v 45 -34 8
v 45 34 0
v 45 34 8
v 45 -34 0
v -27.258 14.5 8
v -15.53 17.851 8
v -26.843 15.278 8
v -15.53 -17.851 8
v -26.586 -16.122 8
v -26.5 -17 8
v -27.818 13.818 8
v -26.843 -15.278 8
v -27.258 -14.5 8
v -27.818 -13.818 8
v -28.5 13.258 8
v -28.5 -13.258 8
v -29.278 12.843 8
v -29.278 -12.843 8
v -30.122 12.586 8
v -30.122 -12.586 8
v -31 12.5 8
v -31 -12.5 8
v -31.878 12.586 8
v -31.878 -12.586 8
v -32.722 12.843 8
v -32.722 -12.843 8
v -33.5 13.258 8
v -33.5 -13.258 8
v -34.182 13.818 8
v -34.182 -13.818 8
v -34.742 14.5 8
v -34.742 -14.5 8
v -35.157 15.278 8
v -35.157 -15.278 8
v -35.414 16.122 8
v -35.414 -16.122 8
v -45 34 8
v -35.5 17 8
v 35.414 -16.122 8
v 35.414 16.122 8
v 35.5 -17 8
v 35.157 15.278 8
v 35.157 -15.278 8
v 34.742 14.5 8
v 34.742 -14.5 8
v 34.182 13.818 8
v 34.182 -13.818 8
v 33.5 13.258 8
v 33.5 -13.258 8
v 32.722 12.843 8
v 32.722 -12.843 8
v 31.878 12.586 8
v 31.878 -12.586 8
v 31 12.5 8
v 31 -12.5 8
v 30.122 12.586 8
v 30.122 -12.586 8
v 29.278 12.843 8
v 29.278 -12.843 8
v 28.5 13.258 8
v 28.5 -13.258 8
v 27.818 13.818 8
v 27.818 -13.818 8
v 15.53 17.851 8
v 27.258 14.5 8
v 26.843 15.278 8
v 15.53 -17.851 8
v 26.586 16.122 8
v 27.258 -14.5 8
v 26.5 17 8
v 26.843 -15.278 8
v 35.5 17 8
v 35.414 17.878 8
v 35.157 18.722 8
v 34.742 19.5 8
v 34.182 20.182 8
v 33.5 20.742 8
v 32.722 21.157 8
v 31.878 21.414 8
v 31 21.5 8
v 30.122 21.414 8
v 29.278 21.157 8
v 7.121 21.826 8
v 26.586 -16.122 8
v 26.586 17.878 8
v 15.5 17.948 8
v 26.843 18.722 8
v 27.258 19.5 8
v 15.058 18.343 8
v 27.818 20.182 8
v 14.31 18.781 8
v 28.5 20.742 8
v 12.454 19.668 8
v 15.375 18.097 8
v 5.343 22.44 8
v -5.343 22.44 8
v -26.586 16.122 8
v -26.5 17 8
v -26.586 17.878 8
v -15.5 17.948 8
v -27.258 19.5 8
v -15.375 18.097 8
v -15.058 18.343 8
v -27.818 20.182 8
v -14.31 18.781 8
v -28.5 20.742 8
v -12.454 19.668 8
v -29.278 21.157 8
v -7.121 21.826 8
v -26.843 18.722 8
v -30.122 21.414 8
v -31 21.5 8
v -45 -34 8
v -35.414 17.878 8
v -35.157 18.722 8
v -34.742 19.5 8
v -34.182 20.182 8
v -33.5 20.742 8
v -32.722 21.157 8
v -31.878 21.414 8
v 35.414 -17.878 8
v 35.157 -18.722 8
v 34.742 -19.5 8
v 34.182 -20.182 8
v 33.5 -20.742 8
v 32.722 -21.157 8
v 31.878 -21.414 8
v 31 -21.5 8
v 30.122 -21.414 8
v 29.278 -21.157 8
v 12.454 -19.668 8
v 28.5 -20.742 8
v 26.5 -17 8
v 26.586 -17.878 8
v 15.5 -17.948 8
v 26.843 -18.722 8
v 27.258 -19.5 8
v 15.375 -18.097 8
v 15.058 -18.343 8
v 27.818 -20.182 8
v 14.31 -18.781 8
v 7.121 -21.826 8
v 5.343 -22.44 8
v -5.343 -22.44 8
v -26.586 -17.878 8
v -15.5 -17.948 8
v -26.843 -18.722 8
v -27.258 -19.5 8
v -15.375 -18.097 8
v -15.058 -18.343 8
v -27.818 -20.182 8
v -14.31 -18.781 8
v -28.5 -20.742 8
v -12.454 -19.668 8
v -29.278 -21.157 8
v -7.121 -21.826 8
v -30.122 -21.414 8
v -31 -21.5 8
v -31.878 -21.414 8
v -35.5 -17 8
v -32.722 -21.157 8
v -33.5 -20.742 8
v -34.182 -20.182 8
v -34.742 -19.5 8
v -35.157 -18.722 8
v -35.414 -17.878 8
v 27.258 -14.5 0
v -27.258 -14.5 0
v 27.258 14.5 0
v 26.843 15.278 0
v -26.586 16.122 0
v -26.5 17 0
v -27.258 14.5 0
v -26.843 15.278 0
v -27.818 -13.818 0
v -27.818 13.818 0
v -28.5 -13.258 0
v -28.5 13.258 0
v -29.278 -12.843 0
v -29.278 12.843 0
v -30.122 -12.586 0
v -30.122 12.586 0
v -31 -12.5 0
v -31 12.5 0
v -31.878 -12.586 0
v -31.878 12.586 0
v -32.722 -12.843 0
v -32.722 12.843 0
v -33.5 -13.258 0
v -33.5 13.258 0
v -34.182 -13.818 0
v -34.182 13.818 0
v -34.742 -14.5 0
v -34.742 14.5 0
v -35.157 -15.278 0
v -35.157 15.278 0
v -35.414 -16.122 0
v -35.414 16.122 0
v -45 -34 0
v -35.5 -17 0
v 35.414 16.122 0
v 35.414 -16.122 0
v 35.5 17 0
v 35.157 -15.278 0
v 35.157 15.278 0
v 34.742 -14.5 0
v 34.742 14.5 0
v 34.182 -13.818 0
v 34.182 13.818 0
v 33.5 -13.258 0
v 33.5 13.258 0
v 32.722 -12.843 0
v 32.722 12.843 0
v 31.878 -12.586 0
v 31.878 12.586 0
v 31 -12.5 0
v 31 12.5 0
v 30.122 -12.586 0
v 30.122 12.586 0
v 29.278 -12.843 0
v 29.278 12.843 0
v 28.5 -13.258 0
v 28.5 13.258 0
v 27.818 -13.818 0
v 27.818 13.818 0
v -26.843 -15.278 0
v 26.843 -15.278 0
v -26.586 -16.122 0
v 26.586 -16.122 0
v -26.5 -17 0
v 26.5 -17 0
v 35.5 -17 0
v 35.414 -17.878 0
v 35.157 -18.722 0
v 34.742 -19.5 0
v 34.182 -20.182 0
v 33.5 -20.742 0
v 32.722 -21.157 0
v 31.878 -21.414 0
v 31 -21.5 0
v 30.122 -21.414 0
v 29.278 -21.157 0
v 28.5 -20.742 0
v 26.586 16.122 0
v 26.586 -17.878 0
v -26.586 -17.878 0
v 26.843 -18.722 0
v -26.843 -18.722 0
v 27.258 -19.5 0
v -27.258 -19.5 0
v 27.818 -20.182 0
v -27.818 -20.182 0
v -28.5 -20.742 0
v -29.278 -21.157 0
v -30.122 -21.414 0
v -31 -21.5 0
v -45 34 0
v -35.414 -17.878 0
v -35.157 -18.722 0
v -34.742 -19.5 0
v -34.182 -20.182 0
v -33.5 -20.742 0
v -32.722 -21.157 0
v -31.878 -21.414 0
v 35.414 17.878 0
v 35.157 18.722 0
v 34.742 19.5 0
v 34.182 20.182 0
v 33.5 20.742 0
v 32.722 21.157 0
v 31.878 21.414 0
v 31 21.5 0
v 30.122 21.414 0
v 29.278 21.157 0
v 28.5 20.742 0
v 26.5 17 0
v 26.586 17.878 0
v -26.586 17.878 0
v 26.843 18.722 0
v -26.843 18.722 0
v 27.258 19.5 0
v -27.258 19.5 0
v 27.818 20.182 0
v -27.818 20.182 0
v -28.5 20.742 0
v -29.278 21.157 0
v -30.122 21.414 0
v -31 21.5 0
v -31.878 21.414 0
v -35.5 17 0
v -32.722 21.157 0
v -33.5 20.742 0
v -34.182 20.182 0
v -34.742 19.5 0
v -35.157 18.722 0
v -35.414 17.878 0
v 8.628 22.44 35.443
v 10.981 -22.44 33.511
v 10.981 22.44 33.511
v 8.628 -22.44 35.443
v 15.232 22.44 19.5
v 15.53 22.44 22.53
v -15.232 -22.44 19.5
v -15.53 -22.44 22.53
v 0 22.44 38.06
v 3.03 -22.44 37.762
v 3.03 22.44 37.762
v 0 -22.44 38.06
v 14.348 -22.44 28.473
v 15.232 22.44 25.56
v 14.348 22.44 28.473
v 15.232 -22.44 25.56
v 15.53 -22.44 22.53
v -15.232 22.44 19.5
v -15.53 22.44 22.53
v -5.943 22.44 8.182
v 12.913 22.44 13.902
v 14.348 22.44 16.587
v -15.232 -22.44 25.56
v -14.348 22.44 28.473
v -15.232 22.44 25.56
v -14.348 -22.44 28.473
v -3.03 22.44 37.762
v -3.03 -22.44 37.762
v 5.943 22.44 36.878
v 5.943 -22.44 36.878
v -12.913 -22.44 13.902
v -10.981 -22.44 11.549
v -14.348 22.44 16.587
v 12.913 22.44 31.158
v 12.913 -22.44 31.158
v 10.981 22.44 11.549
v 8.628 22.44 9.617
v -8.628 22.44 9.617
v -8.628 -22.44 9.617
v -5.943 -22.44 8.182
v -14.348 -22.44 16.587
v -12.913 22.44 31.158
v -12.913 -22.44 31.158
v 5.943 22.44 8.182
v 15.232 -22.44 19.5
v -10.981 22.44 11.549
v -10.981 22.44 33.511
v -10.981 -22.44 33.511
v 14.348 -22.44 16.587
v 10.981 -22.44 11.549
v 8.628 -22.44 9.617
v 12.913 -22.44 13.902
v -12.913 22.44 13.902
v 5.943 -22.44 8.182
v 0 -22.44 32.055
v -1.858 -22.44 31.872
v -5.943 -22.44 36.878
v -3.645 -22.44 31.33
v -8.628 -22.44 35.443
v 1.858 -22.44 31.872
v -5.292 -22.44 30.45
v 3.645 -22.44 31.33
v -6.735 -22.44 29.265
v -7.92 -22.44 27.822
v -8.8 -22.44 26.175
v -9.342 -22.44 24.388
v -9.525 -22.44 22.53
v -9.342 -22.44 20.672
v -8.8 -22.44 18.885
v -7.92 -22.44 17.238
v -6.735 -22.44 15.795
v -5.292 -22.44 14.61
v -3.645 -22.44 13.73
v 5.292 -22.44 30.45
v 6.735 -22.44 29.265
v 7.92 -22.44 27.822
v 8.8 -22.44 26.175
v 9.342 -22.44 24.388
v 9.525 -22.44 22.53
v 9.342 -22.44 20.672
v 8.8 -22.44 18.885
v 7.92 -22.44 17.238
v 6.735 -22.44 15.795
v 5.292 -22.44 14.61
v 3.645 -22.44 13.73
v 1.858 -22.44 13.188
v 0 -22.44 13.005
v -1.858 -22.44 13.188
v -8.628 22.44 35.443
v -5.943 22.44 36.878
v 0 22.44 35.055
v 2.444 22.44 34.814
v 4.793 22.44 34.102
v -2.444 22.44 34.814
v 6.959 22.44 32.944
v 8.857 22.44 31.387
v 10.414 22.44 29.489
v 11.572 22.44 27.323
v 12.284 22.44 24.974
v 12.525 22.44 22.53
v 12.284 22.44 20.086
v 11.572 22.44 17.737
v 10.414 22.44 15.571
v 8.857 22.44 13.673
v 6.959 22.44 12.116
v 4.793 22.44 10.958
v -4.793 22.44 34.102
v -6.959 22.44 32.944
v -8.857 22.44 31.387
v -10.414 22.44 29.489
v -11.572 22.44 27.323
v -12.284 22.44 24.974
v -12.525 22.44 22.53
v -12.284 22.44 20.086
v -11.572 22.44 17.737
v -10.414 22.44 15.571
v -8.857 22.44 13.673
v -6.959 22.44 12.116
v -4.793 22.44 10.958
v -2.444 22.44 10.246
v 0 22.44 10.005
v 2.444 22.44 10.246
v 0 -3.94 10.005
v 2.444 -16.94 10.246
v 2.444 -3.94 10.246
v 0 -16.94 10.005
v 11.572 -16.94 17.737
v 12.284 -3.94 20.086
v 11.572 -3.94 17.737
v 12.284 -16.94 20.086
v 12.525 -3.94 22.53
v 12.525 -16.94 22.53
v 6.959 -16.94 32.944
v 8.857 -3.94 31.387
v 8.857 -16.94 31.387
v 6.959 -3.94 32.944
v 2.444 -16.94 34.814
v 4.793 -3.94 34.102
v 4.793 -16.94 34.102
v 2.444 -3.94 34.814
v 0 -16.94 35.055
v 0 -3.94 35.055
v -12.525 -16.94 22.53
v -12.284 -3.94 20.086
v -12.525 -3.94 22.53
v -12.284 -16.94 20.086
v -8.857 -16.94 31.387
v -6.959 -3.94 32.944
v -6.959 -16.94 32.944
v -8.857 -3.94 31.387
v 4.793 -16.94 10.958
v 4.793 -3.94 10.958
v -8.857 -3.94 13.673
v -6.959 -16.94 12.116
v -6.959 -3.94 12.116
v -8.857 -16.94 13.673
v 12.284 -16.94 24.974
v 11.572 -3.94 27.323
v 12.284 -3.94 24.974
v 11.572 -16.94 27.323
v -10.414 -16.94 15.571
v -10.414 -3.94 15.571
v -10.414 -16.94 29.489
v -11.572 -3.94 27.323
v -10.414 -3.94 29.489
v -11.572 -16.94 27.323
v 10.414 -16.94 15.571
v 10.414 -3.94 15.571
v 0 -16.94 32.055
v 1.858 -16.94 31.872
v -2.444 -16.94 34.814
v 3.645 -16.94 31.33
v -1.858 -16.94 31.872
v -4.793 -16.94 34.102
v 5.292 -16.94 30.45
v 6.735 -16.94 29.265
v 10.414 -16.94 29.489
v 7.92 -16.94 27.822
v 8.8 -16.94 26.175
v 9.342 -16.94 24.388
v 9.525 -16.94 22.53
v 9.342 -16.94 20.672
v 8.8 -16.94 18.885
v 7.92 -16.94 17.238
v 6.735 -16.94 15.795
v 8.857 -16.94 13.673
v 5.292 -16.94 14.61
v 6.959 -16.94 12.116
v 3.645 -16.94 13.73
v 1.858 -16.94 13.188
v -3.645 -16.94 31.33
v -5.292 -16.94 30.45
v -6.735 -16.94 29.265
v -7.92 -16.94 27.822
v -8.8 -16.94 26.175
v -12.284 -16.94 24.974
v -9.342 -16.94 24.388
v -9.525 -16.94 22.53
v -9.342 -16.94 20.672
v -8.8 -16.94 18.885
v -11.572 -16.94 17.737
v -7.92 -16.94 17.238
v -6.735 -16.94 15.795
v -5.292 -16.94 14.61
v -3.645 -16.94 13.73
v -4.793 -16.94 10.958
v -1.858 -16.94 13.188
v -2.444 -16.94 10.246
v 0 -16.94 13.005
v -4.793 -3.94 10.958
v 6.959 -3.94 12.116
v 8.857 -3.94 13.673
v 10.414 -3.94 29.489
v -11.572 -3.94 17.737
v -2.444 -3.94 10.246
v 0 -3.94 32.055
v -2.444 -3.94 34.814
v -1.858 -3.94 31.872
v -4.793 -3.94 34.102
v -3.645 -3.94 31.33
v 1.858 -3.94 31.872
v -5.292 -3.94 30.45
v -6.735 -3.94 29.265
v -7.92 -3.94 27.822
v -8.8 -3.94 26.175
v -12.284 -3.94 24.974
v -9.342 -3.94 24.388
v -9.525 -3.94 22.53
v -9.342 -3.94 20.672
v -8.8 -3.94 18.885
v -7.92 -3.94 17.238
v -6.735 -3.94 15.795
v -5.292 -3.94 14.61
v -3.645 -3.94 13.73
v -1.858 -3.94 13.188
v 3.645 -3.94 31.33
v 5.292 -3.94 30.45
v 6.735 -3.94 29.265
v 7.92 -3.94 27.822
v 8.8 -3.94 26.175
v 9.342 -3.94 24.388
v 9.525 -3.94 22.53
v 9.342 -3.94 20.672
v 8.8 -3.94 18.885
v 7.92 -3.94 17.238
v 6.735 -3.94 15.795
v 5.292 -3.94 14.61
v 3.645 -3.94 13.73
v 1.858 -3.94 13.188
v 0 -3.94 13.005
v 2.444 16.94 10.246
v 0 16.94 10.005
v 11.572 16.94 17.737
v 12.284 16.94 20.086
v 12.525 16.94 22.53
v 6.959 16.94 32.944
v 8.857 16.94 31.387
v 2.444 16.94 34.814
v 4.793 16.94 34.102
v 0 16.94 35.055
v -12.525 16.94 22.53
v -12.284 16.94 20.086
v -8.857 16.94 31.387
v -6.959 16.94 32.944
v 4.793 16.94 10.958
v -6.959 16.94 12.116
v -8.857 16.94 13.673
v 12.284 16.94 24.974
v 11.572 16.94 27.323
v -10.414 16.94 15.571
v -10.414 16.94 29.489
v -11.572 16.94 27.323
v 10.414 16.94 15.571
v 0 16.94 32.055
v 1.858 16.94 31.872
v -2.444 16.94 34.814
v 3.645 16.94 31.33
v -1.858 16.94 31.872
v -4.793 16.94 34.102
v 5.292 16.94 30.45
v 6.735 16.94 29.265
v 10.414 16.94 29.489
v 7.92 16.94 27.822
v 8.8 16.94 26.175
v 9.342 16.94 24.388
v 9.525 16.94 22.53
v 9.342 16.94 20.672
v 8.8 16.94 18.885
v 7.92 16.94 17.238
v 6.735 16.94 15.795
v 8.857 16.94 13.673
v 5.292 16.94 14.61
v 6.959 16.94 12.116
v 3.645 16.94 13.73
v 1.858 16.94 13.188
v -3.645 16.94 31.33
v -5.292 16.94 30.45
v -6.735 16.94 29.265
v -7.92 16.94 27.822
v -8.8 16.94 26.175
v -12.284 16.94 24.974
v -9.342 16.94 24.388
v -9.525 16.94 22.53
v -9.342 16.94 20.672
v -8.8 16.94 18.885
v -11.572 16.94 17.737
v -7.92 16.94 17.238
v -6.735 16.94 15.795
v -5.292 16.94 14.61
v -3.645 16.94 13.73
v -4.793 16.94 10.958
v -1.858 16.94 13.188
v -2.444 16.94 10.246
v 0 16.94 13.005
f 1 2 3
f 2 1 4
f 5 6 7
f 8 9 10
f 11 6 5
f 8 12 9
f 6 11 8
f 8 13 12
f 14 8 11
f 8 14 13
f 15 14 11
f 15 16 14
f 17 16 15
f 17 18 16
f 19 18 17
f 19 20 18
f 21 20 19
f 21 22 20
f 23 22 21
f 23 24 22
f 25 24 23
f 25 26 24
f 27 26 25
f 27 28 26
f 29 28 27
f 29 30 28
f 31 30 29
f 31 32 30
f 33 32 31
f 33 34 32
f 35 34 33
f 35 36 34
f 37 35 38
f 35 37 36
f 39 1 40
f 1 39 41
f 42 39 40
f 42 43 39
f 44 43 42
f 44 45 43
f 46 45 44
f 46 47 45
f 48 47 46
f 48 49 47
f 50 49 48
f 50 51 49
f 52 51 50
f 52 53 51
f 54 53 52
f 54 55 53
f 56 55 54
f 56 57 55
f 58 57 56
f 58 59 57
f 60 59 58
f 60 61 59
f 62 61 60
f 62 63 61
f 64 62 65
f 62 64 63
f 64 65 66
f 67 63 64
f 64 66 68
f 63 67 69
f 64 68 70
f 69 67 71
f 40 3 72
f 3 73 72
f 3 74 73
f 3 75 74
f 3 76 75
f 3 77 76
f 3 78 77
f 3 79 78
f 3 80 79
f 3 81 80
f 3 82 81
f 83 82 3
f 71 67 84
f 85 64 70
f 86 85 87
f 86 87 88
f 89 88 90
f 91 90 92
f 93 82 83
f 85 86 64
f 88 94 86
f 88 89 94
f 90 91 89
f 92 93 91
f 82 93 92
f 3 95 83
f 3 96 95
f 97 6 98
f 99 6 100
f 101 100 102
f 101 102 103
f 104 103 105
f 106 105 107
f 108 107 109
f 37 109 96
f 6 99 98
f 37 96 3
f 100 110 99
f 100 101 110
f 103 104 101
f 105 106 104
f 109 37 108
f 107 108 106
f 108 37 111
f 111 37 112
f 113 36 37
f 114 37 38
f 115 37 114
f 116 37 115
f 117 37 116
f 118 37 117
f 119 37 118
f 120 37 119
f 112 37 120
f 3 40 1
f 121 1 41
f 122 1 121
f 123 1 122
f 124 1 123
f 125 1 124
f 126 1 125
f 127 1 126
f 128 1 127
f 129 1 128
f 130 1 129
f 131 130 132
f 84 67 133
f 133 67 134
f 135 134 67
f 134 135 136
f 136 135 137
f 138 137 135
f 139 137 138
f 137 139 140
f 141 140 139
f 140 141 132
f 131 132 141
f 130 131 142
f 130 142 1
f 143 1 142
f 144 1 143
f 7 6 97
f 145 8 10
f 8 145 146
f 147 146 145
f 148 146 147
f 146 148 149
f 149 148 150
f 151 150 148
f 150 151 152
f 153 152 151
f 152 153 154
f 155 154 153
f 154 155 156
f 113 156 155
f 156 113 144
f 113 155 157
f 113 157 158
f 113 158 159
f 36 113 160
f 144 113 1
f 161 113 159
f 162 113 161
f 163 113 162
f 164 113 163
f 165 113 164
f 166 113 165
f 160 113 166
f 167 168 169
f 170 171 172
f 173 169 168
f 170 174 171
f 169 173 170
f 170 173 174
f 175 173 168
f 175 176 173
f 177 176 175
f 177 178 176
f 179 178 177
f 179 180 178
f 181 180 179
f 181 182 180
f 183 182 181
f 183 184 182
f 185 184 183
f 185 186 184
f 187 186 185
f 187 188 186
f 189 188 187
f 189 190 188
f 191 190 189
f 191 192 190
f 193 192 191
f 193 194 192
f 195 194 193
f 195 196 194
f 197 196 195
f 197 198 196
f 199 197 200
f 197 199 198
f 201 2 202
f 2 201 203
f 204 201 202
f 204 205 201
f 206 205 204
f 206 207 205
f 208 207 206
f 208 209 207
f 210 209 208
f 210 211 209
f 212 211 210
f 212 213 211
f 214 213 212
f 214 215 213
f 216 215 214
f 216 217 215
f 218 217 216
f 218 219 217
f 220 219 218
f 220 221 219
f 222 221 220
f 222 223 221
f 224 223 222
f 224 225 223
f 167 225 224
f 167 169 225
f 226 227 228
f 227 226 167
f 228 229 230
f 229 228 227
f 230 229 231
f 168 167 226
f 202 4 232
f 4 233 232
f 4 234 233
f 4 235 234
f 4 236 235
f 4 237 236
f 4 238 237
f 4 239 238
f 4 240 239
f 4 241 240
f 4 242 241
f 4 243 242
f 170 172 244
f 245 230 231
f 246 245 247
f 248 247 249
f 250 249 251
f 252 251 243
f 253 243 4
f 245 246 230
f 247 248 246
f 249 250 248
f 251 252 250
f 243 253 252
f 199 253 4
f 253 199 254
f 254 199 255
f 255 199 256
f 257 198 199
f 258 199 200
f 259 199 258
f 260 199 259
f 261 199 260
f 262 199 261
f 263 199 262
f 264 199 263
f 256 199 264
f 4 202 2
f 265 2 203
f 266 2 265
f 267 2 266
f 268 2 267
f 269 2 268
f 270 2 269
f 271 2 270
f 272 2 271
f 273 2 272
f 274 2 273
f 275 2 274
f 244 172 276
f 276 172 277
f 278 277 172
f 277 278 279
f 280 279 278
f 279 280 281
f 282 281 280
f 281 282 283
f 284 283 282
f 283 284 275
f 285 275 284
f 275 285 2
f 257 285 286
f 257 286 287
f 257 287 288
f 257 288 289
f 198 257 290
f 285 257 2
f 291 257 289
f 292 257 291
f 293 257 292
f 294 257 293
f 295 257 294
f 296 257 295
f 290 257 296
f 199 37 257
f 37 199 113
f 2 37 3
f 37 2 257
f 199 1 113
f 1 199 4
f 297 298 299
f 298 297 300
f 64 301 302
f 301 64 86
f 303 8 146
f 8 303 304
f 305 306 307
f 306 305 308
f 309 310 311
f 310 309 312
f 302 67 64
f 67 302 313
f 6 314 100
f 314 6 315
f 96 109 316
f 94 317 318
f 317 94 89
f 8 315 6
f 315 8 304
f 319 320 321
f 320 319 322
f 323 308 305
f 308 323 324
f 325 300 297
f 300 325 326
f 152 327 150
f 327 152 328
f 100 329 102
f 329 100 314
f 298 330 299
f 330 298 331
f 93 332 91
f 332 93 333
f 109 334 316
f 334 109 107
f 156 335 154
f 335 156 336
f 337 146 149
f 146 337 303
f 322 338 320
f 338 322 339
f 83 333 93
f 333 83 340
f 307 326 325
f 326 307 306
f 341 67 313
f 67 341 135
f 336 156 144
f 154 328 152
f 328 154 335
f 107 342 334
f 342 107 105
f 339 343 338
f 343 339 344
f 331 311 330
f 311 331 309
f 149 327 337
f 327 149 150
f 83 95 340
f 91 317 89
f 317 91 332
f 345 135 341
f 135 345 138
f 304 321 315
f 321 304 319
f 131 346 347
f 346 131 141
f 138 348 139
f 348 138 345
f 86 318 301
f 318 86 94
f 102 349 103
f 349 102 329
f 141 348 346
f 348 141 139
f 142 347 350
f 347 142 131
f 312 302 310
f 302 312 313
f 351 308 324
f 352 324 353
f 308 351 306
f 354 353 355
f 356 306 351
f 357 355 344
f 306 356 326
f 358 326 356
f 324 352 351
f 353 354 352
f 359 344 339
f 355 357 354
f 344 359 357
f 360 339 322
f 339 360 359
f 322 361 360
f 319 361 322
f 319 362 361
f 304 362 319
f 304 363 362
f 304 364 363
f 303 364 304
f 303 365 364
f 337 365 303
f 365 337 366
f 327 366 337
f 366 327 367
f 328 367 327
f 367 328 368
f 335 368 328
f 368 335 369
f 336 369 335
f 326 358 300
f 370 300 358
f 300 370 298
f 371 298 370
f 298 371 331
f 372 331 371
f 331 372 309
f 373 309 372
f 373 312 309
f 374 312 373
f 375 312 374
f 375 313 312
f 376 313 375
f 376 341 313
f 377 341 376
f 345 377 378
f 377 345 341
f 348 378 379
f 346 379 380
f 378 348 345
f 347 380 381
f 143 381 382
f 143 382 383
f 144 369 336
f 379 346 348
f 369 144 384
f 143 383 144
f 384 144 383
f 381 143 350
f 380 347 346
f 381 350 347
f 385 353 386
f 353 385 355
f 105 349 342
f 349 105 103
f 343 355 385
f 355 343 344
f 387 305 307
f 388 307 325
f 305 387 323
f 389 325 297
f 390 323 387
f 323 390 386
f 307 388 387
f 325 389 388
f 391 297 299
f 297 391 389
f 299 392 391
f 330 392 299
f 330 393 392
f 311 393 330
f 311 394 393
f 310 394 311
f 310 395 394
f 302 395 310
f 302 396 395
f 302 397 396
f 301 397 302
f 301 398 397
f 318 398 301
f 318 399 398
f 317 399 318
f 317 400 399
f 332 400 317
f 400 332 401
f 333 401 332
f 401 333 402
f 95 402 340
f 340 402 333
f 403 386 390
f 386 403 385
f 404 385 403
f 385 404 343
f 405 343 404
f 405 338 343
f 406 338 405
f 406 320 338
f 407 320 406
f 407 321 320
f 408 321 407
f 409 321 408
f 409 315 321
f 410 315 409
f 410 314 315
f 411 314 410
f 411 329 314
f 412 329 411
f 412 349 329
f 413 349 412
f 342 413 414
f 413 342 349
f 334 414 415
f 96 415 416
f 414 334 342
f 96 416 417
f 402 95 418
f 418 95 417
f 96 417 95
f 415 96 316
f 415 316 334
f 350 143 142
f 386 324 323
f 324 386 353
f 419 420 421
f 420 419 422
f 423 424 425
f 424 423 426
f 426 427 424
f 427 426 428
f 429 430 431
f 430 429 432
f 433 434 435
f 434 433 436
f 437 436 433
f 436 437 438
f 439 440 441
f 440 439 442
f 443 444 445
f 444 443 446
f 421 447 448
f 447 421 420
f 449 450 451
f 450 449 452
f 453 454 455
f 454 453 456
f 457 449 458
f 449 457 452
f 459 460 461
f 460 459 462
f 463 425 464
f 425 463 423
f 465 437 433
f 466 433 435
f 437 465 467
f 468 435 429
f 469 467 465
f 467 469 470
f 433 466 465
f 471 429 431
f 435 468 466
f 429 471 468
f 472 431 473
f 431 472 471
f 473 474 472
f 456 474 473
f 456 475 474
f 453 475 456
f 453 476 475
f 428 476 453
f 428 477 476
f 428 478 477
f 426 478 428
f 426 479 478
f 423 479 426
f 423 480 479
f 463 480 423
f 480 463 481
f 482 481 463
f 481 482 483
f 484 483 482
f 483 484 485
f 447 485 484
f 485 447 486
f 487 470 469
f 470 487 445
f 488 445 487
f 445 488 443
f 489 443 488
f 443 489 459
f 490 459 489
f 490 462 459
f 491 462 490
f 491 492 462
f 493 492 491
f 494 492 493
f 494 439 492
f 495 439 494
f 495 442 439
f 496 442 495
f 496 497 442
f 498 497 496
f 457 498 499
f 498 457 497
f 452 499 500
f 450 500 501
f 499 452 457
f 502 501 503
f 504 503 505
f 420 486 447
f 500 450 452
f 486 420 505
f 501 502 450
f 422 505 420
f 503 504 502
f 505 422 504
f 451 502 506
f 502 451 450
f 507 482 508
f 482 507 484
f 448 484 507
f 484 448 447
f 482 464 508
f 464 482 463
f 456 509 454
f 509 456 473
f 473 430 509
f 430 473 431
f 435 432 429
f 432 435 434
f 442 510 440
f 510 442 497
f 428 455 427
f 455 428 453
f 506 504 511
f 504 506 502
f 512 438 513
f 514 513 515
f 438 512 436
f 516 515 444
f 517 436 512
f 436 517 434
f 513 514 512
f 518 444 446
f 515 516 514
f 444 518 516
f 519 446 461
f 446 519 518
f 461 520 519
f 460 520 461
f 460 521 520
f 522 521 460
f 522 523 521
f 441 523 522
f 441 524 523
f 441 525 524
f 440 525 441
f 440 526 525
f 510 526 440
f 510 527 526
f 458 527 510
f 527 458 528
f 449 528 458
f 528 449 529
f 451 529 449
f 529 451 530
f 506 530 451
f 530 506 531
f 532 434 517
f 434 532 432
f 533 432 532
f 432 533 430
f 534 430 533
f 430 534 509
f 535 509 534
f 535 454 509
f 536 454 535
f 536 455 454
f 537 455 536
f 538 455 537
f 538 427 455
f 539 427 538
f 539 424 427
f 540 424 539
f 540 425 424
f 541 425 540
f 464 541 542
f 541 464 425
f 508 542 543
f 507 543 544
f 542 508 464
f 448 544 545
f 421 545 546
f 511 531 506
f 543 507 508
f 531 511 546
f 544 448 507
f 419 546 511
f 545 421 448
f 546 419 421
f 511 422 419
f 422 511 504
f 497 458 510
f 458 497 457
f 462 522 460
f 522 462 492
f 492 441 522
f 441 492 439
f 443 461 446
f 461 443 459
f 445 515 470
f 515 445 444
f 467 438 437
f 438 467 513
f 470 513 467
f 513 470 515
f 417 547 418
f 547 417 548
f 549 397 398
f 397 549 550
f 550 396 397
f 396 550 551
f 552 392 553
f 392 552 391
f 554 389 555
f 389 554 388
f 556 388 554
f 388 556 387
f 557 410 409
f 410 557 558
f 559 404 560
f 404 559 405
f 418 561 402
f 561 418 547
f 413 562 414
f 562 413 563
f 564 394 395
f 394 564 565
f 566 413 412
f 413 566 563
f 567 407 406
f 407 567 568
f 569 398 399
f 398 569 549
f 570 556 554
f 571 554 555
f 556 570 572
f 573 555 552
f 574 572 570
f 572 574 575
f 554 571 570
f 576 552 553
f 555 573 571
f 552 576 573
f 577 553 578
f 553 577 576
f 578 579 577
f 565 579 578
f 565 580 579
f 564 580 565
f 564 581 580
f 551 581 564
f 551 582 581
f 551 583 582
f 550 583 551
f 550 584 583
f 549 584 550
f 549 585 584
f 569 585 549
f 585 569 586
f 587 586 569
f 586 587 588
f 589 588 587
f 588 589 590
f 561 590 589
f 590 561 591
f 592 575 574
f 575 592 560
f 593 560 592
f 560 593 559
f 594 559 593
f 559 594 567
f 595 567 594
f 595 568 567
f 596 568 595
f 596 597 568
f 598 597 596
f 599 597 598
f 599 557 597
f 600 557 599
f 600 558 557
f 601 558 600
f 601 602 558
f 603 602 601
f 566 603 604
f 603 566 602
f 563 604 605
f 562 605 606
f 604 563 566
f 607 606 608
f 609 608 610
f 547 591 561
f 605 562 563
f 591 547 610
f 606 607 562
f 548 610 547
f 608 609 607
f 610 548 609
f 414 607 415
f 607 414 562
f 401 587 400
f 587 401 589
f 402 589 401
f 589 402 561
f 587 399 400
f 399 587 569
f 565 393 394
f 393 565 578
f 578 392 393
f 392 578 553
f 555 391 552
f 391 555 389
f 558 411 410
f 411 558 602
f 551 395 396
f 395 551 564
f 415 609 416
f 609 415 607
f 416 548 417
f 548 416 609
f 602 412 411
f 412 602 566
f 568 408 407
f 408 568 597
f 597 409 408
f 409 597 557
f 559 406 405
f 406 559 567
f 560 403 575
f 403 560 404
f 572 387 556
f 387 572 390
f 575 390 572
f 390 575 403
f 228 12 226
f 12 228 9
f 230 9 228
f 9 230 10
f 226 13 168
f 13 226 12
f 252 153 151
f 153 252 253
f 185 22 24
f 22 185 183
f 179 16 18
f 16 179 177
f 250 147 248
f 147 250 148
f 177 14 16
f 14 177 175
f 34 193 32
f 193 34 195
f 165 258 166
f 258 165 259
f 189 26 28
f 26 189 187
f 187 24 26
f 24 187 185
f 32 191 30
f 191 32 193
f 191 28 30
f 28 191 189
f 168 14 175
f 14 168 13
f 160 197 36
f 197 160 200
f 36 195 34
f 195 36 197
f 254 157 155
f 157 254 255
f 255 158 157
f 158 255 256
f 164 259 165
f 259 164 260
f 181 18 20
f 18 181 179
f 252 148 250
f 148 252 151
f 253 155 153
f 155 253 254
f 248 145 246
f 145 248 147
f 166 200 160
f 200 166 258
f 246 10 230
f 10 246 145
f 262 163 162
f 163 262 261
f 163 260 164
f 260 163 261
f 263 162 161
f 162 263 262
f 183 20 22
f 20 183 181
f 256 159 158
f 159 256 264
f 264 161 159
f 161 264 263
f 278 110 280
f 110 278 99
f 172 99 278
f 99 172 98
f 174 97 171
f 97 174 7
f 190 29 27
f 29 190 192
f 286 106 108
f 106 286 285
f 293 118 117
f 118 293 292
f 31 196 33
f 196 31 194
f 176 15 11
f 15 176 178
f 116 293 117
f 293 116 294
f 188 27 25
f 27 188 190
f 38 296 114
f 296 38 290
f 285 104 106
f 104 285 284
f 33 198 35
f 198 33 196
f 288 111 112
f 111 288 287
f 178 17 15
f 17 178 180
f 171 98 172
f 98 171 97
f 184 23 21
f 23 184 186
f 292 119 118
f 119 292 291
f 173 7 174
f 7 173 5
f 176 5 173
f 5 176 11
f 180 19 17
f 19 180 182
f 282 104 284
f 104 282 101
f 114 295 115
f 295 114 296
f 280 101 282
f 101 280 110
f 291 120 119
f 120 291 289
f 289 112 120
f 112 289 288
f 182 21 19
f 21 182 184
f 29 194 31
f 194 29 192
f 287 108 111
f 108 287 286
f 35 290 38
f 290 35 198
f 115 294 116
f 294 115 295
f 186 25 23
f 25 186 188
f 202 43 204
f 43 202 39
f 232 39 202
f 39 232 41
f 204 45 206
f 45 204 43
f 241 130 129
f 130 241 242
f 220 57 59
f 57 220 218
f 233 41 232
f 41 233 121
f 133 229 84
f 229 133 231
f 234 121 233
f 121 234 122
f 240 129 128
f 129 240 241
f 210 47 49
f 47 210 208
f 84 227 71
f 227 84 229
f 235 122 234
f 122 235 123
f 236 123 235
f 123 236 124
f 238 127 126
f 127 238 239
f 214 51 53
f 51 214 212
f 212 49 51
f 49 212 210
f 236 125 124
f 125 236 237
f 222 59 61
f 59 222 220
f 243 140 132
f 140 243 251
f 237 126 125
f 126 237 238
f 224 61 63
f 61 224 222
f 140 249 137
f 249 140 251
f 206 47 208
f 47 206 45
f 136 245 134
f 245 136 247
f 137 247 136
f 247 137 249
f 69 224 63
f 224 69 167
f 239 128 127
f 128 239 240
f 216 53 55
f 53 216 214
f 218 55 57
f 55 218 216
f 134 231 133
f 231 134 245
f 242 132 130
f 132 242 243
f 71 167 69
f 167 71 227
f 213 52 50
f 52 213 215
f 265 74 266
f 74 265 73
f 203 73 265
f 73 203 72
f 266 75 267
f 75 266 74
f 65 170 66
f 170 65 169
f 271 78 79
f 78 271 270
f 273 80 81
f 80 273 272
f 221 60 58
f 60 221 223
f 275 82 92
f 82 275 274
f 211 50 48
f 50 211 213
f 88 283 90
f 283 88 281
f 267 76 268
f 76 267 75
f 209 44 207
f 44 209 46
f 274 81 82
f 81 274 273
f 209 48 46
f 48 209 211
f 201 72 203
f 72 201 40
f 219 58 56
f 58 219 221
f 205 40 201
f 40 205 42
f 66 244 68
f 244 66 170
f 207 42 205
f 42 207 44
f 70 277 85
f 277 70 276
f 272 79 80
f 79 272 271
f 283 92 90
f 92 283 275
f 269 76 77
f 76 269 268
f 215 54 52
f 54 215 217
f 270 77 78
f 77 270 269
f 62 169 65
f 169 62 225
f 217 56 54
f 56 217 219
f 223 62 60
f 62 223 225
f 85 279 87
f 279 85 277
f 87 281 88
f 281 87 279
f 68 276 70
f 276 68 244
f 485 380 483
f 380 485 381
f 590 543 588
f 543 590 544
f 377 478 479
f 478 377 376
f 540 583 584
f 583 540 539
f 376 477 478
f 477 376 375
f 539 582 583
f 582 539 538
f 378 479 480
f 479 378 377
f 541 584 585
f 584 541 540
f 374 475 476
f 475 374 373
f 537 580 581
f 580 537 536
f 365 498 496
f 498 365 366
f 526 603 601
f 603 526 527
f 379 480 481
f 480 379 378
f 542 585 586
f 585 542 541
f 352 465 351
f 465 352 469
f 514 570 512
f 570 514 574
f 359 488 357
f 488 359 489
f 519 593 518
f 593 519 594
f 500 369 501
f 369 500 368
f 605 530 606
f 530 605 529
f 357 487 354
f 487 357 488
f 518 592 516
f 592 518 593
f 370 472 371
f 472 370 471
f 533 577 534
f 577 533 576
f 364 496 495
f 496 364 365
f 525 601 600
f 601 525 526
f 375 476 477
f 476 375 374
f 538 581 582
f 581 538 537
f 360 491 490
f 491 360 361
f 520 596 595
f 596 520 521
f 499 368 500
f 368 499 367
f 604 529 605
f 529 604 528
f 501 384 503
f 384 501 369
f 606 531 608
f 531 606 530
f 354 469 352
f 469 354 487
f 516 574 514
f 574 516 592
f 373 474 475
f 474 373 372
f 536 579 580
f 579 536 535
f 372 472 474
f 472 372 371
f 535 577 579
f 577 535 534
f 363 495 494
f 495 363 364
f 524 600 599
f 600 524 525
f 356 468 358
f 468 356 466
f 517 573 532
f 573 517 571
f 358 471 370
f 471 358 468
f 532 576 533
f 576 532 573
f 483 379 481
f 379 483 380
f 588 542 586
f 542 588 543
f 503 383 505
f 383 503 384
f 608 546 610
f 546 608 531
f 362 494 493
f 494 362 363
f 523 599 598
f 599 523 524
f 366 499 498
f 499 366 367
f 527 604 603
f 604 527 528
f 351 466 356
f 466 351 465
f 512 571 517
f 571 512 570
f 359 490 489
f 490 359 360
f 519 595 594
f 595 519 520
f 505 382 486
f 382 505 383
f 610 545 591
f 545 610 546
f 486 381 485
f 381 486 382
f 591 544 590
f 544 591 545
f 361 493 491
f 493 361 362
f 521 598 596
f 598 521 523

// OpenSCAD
$fn = 32;

// ----------------------------------------------------------------------
// Bearing block: 90 x 68 mm base, 19.05 mm bore at 22.53 mm
// ----------------------------------------------------------------------

// --- parameters (mm) ---
base_w = 90;              // base width
base_d = 68;              // base depth
base_t = 8;               // base thickness
bore_d = 19.05;           // shaft / bearing bore
house_r = 15.53;          // housing outer radius
house_len = 44.88;        // housing length along the shaft
foot_w = 31.06;           // foot width under the housing
foot_len = 34.88;         // foot length along the shaft
axis_z = 22.53;           // bore axis height above the base
holes_d = 9;              // mounting holes
hole_x = 31;              // mounting hole spacing
seat_d = 8;               // bearing seat depth
seat_wall = 3;            // seat wall thickness

difference() {
  union() {
    /* base plate with its underside on z = 0 */
    translate([0, 0, base_t / 2]) cube([base_w, base_d, base_t], center = true);
    /* hull foot: a straight web blending into the round housing */
    hull() {
      translate([0, 0, base_t - 0.5]) cube([foot_w, foot_len, 1.6], center = true);
      translate([0, 0, axis_z]) rotate([-90, 0, 0]) cylinder(h = house_len, d = 2 * house_r, center = true);
    }
  }
  /* bore through the housing, 2.5 mm clear on both sides */
  translate([0, 0, axis_z]) rotate([-90, 0, 0]) cylinder(h = house_len + 5, d = bore_d, center = true);
  /* bearing seats, recessed into both ends of the housing */
  for (sy = [-1, 1]) {
    translate([0, sy * (house_len / 2 - seat_d + 2.5), axis_z]) rotate([-90, 0, 0]) cylinder(h = seat_d + 5, d = bore_d + 2 * seat_wall);
  }
  /* mounting holes through the base plate */
  for (hx = [-31, 31]) {
    for (hy = [-17, 17]) {
      translate([hx, hy, -2.5]) cylinder(h = base_t + 5, d = holes_d);
    }
  }
}
